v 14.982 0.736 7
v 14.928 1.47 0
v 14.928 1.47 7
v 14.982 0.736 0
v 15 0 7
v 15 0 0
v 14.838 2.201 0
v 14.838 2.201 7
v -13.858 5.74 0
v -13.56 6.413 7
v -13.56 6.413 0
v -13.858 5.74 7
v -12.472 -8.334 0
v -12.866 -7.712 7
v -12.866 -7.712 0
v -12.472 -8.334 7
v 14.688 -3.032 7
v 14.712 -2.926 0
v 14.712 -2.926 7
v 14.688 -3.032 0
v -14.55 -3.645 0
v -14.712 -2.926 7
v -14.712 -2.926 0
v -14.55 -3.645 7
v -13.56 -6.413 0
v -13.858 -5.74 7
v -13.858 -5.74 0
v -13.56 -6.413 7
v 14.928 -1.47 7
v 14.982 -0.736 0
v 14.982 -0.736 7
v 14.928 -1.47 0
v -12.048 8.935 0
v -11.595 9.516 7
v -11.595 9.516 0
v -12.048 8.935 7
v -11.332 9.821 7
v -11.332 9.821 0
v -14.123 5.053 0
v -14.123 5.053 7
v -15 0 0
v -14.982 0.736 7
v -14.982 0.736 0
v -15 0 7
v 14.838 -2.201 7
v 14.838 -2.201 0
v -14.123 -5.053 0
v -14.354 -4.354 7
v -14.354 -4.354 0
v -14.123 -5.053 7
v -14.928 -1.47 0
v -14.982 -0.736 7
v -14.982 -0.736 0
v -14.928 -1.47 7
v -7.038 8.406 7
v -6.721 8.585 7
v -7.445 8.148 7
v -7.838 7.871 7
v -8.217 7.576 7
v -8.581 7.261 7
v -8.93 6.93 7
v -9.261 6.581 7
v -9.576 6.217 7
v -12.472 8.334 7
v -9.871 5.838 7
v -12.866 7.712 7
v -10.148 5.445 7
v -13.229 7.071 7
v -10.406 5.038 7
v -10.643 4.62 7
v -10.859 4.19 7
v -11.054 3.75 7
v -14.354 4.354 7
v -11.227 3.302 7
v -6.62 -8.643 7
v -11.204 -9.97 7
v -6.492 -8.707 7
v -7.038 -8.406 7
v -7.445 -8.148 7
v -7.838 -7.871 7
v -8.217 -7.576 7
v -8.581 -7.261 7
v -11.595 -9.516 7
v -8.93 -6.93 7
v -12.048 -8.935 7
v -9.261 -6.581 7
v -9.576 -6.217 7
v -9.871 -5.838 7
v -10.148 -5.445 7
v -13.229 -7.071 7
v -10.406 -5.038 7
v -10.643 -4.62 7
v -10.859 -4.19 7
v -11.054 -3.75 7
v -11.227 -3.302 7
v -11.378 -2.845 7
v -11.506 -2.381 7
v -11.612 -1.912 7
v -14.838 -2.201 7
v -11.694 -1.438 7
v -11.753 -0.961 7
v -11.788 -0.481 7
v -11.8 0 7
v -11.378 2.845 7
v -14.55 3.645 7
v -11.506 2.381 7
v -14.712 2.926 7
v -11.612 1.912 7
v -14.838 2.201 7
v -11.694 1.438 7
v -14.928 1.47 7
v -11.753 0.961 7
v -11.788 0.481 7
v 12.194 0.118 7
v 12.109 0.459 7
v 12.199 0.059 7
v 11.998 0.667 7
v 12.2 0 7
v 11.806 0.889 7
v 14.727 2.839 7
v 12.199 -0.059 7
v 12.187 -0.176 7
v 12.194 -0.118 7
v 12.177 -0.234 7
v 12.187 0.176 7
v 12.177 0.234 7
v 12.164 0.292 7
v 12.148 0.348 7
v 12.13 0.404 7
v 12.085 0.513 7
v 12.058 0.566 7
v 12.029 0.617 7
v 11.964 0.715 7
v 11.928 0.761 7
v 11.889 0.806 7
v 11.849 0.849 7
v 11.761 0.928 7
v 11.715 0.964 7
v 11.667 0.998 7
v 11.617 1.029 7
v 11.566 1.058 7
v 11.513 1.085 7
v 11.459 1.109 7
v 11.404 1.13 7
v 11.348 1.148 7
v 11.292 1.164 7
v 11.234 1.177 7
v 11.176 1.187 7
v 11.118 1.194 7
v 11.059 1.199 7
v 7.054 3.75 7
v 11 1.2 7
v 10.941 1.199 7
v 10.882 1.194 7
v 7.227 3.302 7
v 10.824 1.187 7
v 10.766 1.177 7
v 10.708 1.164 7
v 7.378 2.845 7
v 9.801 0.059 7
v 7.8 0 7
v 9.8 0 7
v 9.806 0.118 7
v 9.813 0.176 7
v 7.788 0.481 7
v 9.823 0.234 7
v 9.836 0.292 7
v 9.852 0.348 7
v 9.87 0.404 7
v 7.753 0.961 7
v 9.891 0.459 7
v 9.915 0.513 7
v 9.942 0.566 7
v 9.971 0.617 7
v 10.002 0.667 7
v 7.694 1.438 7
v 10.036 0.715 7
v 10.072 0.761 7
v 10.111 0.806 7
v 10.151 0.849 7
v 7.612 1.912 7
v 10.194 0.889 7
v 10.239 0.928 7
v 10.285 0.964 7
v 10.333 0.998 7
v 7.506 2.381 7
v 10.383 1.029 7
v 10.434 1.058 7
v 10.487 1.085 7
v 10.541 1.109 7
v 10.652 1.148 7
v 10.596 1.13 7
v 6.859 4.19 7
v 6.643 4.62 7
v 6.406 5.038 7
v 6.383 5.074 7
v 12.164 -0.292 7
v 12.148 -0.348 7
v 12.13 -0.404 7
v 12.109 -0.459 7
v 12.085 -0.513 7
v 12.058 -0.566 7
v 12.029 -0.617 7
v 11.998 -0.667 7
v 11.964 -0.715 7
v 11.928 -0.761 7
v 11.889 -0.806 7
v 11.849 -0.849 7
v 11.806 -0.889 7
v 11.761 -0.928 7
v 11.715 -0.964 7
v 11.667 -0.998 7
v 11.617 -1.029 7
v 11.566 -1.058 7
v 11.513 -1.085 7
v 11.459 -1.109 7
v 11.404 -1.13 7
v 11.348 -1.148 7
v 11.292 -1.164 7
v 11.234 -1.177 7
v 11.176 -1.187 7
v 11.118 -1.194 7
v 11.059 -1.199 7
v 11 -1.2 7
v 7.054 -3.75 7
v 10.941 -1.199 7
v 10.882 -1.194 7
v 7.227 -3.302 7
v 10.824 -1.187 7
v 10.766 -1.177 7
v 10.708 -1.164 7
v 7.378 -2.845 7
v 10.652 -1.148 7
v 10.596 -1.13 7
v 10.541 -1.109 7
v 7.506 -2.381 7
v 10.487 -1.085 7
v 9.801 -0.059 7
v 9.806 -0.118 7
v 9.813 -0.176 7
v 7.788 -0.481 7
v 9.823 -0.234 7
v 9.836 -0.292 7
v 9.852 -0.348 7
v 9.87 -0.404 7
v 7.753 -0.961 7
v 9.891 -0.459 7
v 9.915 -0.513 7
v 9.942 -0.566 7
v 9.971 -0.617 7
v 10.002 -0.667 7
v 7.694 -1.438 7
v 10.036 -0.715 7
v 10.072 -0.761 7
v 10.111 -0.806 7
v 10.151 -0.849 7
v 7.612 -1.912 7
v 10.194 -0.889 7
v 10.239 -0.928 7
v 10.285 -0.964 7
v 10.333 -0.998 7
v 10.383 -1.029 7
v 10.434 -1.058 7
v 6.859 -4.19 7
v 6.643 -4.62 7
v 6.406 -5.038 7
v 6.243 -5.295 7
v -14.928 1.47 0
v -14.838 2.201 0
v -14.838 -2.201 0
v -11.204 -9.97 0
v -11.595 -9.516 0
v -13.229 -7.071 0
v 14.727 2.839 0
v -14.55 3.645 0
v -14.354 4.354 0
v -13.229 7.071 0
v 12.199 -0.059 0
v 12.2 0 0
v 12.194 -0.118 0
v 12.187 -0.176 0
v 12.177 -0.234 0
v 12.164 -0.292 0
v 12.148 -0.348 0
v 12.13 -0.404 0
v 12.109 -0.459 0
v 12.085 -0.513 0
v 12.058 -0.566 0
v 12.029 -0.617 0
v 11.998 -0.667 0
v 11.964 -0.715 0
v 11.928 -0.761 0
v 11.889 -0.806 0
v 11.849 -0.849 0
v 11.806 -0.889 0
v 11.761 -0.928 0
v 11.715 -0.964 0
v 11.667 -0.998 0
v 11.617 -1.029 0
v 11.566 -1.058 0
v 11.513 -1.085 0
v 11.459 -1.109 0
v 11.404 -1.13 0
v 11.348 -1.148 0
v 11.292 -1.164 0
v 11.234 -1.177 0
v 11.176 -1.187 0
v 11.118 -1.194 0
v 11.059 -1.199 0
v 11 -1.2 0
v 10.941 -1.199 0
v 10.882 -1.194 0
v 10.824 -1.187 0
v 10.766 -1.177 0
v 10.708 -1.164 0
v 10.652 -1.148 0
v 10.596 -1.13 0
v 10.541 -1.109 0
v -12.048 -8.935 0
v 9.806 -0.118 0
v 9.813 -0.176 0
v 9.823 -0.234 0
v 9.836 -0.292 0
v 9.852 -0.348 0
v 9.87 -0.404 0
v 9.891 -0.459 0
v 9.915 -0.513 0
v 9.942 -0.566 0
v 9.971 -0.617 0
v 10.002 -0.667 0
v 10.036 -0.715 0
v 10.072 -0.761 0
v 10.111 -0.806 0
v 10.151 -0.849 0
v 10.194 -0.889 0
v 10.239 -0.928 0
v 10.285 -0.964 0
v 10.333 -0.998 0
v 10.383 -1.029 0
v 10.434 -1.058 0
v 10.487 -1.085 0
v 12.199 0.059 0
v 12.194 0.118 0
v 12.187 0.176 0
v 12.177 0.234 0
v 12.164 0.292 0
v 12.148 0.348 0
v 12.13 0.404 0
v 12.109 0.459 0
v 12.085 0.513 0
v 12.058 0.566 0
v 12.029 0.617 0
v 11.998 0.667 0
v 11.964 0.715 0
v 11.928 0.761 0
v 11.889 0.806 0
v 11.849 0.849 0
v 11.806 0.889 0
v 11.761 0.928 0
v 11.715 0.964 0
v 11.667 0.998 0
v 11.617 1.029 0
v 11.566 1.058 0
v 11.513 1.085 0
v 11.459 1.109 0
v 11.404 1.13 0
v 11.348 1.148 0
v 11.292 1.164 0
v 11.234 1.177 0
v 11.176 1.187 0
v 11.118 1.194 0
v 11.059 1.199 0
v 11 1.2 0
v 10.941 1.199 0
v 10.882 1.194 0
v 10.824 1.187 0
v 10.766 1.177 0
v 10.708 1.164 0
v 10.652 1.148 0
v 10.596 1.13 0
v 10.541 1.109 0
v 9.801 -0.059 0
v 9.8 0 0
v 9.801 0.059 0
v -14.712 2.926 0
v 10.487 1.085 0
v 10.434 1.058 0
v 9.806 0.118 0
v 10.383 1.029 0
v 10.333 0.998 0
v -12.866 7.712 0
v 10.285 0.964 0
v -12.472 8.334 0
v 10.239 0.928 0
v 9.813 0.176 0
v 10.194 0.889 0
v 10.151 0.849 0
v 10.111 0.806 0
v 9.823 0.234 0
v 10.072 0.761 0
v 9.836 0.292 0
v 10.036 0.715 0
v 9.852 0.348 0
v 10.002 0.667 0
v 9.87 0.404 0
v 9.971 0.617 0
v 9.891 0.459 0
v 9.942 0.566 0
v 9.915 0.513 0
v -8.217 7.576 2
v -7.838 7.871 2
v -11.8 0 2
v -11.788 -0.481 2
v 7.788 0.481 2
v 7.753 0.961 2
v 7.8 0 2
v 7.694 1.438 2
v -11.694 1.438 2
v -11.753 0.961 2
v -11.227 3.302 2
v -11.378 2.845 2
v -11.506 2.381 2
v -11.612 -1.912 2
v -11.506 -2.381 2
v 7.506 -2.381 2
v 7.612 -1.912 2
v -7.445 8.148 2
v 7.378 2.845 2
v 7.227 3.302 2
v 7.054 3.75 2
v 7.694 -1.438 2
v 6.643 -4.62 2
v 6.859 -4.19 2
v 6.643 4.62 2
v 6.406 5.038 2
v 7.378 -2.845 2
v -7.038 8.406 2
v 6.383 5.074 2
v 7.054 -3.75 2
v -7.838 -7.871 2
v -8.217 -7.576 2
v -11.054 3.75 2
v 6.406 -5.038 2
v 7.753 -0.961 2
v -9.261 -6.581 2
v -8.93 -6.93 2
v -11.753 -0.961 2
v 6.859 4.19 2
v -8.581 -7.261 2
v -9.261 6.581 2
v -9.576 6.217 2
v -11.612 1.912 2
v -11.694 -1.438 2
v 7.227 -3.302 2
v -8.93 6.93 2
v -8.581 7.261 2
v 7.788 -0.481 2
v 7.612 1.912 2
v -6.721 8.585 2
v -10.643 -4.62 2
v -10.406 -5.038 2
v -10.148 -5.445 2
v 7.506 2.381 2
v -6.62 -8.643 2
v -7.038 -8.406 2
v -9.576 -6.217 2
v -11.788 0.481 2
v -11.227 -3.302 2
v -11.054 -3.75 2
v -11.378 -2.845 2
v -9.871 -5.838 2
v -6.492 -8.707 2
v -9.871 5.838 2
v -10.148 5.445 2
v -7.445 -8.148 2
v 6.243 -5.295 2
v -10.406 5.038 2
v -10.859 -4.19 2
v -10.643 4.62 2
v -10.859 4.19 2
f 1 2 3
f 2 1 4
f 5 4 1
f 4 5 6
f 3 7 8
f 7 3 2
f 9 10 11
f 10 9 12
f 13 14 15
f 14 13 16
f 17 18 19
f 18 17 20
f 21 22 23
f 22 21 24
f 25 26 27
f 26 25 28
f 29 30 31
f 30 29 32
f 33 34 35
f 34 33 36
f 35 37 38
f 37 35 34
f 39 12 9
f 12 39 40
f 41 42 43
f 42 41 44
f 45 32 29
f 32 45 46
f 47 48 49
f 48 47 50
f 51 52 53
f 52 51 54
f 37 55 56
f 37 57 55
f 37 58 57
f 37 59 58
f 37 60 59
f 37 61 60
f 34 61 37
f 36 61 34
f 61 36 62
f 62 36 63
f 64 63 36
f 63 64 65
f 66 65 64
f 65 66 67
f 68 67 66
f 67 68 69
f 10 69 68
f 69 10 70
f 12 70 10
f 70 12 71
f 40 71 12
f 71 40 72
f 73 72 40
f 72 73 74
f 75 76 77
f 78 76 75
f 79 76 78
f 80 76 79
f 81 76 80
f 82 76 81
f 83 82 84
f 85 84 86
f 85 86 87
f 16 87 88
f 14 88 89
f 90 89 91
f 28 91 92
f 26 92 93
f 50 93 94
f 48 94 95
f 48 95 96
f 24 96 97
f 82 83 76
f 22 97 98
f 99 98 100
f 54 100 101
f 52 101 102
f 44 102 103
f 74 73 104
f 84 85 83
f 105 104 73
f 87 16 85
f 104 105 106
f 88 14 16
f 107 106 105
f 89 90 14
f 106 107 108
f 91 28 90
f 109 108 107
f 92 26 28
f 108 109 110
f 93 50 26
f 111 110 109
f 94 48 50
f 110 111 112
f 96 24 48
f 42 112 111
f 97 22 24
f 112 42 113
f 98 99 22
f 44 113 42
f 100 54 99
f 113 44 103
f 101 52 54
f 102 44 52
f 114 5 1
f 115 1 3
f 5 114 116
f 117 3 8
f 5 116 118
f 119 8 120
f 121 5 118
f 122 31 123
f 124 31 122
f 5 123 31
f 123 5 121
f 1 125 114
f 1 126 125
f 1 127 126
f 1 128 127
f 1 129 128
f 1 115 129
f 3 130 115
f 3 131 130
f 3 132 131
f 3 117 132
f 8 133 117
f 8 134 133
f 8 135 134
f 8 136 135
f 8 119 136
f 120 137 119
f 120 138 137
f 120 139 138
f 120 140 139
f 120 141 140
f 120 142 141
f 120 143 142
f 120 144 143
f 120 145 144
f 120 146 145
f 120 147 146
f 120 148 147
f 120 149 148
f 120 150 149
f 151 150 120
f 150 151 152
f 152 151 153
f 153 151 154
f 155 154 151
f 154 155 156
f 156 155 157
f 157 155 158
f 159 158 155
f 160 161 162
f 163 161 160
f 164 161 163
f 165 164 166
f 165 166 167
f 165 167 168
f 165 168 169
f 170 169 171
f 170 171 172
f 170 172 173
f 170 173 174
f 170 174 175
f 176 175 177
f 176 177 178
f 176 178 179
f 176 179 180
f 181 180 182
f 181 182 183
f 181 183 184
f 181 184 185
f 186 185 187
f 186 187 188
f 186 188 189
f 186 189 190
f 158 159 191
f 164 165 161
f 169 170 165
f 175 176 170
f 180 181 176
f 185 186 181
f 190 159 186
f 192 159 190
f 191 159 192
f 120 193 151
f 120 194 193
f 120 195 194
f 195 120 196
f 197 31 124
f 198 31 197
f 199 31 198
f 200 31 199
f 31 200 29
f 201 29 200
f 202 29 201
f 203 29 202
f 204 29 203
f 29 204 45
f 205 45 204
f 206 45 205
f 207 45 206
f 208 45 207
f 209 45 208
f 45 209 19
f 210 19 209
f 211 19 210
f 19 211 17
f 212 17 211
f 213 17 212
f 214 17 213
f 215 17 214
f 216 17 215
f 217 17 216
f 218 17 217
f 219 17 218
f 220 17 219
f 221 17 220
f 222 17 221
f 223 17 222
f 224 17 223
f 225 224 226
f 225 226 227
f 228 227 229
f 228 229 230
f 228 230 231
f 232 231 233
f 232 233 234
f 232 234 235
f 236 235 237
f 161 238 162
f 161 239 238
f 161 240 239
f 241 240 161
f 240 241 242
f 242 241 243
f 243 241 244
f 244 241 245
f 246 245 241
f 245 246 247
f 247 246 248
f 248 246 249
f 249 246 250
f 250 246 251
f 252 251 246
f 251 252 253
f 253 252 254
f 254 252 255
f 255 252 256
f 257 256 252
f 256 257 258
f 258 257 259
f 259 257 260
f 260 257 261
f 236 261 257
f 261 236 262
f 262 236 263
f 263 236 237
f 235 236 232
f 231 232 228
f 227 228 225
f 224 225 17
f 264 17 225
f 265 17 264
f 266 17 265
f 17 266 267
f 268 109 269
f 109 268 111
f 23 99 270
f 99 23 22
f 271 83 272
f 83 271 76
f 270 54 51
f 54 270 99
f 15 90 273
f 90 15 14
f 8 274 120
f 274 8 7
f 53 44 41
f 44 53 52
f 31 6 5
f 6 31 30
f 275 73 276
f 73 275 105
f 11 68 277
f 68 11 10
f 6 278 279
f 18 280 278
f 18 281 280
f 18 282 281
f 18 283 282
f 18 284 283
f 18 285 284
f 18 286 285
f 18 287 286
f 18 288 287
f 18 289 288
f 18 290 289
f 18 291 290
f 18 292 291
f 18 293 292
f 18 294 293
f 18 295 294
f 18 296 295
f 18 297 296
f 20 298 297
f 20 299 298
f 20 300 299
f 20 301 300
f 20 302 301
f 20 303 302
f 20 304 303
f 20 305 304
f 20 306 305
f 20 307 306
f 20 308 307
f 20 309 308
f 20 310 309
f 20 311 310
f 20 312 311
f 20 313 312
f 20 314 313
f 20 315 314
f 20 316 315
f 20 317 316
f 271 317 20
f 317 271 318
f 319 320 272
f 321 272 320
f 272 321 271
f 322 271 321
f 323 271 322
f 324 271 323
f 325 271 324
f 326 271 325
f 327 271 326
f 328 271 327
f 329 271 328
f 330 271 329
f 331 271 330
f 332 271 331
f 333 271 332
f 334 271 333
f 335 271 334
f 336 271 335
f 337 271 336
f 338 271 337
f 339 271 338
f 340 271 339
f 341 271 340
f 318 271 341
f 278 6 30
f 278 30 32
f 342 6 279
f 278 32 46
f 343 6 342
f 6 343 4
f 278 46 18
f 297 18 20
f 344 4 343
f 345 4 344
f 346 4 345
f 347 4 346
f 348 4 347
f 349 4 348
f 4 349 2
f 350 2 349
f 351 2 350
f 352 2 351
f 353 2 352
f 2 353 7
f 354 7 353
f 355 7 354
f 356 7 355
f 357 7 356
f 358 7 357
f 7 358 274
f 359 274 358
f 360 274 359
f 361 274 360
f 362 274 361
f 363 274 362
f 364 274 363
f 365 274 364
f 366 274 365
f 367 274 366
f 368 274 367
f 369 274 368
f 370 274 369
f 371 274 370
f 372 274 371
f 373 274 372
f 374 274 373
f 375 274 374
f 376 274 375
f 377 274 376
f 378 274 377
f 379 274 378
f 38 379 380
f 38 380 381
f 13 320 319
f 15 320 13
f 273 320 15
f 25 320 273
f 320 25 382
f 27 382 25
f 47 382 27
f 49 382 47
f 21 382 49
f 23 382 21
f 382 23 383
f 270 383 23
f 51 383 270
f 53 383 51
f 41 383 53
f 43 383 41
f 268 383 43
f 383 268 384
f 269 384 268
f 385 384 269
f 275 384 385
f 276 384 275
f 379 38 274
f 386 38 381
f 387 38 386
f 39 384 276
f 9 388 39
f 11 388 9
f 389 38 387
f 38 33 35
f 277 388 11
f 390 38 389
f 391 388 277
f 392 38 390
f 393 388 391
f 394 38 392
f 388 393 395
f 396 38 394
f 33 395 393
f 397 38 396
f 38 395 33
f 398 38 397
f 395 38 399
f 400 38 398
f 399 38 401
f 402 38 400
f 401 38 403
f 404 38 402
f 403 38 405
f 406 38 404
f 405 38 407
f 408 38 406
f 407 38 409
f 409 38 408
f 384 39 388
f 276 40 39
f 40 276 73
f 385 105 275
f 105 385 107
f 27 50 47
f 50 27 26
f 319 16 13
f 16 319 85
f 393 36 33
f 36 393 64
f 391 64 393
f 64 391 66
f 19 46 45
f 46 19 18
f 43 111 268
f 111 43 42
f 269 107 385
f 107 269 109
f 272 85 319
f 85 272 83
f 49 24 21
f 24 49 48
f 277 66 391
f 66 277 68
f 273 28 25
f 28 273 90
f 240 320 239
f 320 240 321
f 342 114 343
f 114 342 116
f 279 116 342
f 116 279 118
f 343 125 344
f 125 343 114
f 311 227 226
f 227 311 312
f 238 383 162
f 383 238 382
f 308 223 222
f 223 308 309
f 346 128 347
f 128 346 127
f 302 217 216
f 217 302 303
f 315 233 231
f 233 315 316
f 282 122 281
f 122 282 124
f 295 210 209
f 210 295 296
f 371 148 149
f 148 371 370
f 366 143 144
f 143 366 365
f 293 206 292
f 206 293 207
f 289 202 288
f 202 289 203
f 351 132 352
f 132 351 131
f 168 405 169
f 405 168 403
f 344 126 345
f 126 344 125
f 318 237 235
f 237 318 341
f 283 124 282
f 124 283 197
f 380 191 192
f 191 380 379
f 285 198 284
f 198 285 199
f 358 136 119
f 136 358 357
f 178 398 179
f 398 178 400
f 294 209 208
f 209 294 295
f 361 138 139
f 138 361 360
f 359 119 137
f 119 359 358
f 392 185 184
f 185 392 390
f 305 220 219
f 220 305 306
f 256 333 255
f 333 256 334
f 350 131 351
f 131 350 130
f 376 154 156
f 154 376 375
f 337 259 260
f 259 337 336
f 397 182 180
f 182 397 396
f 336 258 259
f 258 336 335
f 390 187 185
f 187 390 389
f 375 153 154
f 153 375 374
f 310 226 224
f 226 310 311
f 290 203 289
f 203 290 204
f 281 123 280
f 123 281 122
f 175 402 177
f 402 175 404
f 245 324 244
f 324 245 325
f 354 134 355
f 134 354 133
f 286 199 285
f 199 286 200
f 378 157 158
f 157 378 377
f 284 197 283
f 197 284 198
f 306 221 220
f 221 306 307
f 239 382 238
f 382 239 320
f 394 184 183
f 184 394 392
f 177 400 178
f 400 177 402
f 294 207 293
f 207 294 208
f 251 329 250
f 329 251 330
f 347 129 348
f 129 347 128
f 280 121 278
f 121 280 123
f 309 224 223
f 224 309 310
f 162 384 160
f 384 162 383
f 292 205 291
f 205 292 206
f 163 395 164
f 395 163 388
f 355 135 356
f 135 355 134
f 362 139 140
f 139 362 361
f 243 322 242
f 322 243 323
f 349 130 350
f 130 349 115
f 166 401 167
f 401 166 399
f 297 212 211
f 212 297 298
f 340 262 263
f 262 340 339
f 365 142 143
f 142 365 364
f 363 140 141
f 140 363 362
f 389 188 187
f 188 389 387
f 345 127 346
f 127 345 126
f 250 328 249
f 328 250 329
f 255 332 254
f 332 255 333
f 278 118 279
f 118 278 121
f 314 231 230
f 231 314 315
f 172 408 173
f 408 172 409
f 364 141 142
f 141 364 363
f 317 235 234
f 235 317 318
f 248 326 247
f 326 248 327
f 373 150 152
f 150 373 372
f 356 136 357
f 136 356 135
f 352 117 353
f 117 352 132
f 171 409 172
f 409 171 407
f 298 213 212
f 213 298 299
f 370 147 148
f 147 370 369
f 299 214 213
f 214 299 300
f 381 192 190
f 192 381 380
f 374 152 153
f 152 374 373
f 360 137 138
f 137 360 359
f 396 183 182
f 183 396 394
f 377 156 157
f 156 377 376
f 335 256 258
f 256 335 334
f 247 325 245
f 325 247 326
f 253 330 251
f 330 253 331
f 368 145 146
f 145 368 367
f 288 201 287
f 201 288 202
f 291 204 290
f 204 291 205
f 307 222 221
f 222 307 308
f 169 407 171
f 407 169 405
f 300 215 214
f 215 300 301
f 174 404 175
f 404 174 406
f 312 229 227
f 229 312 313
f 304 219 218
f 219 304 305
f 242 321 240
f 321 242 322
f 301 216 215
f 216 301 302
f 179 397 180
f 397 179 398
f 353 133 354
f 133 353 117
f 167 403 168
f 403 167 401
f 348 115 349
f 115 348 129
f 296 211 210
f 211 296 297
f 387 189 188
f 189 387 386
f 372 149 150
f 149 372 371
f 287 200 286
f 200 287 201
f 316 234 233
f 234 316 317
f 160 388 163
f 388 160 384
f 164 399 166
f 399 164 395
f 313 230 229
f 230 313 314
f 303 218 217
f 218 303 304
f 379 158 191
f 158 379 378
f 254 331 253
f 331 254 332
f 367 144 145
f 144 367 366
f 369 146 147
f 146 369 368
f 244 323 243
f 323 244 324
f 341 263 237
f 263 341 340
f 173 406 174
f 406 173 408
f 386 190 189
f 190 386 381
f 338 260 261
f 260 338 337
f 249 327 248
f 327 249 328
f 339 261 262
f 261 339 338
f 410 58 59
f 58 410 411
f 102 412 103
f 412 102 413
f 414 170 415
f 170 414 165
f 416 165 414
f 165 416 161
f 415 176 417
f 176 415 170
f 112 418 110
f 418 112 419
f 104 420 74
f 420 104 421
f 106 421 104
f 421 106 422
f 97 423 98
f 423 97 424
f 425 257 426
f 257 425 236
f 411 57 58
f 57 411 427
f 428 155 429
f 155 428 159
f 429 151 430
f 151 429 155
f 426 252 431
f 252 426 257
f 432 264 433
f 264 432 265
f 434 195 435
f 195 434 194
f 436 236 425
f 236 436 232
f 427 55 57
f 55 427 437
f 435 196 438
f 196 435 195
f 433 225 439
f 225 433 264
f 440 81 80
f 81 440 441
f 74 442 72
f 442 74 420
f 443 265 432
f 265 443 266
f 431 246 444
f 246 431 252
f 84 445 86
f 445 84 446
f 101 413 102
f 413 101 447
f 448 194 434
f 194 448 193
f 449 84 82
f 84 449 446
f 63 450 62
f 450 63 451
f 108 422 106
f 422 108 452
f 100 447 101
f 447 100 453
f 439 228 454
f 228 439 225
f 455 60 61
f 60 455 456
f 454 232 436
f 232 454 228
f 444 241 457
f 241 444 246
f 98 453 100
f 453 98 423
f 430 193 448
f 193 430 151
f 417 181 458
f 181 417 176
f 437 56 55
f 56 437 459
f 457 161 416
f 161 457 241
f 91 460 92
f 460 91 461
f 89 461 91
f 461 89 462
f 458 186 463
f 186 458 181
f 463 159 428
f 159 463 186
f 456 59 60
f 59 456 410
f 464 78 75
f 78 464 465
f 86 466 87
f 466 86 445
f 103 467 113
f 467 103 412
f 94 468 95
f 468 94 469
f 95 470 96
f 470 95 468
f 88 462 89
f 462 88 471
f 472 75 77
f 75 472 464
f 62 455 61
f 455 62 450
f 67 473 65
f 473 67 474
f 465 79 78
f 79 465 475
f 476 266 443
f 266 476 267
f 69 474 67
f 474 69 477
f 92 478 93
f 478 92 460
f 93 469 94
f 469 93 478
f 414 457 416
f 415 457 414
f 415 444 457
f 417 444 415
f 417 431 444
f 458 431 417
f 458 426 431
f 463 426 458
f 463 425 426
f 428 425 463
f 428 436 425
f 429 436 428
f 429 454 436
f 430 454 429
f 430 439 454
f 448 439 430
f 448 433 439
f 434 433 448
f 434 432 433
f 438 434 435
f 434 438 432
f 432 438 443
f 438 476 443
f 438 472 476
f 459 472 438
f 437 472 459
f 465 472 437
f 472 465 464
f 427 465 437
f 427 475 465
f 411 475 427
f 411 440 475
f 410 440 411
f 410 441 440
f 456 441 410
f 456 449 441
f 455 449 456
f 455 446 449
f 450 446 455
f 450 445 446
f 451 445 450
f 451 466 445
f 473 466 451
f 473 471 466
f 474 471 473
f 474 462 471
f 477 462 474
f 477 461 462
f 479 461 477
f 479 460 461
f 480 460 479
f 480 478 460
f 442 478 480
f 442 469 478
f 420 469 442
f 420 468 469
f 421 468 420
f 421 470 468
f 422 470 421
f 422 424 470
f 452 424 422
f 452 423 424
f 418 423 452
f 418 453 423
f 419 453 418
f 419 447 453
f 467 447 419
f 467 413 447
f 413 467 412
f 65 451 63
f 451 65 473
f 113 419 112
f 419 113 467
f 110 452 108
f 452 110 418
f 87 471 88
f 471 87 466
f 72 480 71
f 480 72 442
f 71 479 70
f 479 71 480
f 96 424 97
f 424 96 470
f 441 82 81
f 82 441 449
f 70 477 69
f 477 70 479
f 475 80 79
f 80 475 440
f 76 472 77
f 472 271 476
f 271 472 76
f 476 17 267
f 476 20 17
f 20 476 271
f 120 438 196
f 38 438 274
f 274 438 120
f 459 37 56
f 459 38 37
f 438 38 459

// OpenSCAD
$fn=128;
$height = 7;
difference () {
   cylinder(r=15, h=$height);
   translate([11,0,-1]) {
      cylinder(r=1.2	, h=$height+2);
   }
   translate([-2,0,2]) {
      cylinder(r=9.8, h=$height-1);
   }
   translate([-10,-20,-1]) {
      rotate([0,0,15]) {
         cube([40,10,$height+2]);
      }
   }
   translate([-12,+10,-1]) {
      rotate([0,0,-15]) {
         cube([40,10,$height+2]);
      }
   }
}
